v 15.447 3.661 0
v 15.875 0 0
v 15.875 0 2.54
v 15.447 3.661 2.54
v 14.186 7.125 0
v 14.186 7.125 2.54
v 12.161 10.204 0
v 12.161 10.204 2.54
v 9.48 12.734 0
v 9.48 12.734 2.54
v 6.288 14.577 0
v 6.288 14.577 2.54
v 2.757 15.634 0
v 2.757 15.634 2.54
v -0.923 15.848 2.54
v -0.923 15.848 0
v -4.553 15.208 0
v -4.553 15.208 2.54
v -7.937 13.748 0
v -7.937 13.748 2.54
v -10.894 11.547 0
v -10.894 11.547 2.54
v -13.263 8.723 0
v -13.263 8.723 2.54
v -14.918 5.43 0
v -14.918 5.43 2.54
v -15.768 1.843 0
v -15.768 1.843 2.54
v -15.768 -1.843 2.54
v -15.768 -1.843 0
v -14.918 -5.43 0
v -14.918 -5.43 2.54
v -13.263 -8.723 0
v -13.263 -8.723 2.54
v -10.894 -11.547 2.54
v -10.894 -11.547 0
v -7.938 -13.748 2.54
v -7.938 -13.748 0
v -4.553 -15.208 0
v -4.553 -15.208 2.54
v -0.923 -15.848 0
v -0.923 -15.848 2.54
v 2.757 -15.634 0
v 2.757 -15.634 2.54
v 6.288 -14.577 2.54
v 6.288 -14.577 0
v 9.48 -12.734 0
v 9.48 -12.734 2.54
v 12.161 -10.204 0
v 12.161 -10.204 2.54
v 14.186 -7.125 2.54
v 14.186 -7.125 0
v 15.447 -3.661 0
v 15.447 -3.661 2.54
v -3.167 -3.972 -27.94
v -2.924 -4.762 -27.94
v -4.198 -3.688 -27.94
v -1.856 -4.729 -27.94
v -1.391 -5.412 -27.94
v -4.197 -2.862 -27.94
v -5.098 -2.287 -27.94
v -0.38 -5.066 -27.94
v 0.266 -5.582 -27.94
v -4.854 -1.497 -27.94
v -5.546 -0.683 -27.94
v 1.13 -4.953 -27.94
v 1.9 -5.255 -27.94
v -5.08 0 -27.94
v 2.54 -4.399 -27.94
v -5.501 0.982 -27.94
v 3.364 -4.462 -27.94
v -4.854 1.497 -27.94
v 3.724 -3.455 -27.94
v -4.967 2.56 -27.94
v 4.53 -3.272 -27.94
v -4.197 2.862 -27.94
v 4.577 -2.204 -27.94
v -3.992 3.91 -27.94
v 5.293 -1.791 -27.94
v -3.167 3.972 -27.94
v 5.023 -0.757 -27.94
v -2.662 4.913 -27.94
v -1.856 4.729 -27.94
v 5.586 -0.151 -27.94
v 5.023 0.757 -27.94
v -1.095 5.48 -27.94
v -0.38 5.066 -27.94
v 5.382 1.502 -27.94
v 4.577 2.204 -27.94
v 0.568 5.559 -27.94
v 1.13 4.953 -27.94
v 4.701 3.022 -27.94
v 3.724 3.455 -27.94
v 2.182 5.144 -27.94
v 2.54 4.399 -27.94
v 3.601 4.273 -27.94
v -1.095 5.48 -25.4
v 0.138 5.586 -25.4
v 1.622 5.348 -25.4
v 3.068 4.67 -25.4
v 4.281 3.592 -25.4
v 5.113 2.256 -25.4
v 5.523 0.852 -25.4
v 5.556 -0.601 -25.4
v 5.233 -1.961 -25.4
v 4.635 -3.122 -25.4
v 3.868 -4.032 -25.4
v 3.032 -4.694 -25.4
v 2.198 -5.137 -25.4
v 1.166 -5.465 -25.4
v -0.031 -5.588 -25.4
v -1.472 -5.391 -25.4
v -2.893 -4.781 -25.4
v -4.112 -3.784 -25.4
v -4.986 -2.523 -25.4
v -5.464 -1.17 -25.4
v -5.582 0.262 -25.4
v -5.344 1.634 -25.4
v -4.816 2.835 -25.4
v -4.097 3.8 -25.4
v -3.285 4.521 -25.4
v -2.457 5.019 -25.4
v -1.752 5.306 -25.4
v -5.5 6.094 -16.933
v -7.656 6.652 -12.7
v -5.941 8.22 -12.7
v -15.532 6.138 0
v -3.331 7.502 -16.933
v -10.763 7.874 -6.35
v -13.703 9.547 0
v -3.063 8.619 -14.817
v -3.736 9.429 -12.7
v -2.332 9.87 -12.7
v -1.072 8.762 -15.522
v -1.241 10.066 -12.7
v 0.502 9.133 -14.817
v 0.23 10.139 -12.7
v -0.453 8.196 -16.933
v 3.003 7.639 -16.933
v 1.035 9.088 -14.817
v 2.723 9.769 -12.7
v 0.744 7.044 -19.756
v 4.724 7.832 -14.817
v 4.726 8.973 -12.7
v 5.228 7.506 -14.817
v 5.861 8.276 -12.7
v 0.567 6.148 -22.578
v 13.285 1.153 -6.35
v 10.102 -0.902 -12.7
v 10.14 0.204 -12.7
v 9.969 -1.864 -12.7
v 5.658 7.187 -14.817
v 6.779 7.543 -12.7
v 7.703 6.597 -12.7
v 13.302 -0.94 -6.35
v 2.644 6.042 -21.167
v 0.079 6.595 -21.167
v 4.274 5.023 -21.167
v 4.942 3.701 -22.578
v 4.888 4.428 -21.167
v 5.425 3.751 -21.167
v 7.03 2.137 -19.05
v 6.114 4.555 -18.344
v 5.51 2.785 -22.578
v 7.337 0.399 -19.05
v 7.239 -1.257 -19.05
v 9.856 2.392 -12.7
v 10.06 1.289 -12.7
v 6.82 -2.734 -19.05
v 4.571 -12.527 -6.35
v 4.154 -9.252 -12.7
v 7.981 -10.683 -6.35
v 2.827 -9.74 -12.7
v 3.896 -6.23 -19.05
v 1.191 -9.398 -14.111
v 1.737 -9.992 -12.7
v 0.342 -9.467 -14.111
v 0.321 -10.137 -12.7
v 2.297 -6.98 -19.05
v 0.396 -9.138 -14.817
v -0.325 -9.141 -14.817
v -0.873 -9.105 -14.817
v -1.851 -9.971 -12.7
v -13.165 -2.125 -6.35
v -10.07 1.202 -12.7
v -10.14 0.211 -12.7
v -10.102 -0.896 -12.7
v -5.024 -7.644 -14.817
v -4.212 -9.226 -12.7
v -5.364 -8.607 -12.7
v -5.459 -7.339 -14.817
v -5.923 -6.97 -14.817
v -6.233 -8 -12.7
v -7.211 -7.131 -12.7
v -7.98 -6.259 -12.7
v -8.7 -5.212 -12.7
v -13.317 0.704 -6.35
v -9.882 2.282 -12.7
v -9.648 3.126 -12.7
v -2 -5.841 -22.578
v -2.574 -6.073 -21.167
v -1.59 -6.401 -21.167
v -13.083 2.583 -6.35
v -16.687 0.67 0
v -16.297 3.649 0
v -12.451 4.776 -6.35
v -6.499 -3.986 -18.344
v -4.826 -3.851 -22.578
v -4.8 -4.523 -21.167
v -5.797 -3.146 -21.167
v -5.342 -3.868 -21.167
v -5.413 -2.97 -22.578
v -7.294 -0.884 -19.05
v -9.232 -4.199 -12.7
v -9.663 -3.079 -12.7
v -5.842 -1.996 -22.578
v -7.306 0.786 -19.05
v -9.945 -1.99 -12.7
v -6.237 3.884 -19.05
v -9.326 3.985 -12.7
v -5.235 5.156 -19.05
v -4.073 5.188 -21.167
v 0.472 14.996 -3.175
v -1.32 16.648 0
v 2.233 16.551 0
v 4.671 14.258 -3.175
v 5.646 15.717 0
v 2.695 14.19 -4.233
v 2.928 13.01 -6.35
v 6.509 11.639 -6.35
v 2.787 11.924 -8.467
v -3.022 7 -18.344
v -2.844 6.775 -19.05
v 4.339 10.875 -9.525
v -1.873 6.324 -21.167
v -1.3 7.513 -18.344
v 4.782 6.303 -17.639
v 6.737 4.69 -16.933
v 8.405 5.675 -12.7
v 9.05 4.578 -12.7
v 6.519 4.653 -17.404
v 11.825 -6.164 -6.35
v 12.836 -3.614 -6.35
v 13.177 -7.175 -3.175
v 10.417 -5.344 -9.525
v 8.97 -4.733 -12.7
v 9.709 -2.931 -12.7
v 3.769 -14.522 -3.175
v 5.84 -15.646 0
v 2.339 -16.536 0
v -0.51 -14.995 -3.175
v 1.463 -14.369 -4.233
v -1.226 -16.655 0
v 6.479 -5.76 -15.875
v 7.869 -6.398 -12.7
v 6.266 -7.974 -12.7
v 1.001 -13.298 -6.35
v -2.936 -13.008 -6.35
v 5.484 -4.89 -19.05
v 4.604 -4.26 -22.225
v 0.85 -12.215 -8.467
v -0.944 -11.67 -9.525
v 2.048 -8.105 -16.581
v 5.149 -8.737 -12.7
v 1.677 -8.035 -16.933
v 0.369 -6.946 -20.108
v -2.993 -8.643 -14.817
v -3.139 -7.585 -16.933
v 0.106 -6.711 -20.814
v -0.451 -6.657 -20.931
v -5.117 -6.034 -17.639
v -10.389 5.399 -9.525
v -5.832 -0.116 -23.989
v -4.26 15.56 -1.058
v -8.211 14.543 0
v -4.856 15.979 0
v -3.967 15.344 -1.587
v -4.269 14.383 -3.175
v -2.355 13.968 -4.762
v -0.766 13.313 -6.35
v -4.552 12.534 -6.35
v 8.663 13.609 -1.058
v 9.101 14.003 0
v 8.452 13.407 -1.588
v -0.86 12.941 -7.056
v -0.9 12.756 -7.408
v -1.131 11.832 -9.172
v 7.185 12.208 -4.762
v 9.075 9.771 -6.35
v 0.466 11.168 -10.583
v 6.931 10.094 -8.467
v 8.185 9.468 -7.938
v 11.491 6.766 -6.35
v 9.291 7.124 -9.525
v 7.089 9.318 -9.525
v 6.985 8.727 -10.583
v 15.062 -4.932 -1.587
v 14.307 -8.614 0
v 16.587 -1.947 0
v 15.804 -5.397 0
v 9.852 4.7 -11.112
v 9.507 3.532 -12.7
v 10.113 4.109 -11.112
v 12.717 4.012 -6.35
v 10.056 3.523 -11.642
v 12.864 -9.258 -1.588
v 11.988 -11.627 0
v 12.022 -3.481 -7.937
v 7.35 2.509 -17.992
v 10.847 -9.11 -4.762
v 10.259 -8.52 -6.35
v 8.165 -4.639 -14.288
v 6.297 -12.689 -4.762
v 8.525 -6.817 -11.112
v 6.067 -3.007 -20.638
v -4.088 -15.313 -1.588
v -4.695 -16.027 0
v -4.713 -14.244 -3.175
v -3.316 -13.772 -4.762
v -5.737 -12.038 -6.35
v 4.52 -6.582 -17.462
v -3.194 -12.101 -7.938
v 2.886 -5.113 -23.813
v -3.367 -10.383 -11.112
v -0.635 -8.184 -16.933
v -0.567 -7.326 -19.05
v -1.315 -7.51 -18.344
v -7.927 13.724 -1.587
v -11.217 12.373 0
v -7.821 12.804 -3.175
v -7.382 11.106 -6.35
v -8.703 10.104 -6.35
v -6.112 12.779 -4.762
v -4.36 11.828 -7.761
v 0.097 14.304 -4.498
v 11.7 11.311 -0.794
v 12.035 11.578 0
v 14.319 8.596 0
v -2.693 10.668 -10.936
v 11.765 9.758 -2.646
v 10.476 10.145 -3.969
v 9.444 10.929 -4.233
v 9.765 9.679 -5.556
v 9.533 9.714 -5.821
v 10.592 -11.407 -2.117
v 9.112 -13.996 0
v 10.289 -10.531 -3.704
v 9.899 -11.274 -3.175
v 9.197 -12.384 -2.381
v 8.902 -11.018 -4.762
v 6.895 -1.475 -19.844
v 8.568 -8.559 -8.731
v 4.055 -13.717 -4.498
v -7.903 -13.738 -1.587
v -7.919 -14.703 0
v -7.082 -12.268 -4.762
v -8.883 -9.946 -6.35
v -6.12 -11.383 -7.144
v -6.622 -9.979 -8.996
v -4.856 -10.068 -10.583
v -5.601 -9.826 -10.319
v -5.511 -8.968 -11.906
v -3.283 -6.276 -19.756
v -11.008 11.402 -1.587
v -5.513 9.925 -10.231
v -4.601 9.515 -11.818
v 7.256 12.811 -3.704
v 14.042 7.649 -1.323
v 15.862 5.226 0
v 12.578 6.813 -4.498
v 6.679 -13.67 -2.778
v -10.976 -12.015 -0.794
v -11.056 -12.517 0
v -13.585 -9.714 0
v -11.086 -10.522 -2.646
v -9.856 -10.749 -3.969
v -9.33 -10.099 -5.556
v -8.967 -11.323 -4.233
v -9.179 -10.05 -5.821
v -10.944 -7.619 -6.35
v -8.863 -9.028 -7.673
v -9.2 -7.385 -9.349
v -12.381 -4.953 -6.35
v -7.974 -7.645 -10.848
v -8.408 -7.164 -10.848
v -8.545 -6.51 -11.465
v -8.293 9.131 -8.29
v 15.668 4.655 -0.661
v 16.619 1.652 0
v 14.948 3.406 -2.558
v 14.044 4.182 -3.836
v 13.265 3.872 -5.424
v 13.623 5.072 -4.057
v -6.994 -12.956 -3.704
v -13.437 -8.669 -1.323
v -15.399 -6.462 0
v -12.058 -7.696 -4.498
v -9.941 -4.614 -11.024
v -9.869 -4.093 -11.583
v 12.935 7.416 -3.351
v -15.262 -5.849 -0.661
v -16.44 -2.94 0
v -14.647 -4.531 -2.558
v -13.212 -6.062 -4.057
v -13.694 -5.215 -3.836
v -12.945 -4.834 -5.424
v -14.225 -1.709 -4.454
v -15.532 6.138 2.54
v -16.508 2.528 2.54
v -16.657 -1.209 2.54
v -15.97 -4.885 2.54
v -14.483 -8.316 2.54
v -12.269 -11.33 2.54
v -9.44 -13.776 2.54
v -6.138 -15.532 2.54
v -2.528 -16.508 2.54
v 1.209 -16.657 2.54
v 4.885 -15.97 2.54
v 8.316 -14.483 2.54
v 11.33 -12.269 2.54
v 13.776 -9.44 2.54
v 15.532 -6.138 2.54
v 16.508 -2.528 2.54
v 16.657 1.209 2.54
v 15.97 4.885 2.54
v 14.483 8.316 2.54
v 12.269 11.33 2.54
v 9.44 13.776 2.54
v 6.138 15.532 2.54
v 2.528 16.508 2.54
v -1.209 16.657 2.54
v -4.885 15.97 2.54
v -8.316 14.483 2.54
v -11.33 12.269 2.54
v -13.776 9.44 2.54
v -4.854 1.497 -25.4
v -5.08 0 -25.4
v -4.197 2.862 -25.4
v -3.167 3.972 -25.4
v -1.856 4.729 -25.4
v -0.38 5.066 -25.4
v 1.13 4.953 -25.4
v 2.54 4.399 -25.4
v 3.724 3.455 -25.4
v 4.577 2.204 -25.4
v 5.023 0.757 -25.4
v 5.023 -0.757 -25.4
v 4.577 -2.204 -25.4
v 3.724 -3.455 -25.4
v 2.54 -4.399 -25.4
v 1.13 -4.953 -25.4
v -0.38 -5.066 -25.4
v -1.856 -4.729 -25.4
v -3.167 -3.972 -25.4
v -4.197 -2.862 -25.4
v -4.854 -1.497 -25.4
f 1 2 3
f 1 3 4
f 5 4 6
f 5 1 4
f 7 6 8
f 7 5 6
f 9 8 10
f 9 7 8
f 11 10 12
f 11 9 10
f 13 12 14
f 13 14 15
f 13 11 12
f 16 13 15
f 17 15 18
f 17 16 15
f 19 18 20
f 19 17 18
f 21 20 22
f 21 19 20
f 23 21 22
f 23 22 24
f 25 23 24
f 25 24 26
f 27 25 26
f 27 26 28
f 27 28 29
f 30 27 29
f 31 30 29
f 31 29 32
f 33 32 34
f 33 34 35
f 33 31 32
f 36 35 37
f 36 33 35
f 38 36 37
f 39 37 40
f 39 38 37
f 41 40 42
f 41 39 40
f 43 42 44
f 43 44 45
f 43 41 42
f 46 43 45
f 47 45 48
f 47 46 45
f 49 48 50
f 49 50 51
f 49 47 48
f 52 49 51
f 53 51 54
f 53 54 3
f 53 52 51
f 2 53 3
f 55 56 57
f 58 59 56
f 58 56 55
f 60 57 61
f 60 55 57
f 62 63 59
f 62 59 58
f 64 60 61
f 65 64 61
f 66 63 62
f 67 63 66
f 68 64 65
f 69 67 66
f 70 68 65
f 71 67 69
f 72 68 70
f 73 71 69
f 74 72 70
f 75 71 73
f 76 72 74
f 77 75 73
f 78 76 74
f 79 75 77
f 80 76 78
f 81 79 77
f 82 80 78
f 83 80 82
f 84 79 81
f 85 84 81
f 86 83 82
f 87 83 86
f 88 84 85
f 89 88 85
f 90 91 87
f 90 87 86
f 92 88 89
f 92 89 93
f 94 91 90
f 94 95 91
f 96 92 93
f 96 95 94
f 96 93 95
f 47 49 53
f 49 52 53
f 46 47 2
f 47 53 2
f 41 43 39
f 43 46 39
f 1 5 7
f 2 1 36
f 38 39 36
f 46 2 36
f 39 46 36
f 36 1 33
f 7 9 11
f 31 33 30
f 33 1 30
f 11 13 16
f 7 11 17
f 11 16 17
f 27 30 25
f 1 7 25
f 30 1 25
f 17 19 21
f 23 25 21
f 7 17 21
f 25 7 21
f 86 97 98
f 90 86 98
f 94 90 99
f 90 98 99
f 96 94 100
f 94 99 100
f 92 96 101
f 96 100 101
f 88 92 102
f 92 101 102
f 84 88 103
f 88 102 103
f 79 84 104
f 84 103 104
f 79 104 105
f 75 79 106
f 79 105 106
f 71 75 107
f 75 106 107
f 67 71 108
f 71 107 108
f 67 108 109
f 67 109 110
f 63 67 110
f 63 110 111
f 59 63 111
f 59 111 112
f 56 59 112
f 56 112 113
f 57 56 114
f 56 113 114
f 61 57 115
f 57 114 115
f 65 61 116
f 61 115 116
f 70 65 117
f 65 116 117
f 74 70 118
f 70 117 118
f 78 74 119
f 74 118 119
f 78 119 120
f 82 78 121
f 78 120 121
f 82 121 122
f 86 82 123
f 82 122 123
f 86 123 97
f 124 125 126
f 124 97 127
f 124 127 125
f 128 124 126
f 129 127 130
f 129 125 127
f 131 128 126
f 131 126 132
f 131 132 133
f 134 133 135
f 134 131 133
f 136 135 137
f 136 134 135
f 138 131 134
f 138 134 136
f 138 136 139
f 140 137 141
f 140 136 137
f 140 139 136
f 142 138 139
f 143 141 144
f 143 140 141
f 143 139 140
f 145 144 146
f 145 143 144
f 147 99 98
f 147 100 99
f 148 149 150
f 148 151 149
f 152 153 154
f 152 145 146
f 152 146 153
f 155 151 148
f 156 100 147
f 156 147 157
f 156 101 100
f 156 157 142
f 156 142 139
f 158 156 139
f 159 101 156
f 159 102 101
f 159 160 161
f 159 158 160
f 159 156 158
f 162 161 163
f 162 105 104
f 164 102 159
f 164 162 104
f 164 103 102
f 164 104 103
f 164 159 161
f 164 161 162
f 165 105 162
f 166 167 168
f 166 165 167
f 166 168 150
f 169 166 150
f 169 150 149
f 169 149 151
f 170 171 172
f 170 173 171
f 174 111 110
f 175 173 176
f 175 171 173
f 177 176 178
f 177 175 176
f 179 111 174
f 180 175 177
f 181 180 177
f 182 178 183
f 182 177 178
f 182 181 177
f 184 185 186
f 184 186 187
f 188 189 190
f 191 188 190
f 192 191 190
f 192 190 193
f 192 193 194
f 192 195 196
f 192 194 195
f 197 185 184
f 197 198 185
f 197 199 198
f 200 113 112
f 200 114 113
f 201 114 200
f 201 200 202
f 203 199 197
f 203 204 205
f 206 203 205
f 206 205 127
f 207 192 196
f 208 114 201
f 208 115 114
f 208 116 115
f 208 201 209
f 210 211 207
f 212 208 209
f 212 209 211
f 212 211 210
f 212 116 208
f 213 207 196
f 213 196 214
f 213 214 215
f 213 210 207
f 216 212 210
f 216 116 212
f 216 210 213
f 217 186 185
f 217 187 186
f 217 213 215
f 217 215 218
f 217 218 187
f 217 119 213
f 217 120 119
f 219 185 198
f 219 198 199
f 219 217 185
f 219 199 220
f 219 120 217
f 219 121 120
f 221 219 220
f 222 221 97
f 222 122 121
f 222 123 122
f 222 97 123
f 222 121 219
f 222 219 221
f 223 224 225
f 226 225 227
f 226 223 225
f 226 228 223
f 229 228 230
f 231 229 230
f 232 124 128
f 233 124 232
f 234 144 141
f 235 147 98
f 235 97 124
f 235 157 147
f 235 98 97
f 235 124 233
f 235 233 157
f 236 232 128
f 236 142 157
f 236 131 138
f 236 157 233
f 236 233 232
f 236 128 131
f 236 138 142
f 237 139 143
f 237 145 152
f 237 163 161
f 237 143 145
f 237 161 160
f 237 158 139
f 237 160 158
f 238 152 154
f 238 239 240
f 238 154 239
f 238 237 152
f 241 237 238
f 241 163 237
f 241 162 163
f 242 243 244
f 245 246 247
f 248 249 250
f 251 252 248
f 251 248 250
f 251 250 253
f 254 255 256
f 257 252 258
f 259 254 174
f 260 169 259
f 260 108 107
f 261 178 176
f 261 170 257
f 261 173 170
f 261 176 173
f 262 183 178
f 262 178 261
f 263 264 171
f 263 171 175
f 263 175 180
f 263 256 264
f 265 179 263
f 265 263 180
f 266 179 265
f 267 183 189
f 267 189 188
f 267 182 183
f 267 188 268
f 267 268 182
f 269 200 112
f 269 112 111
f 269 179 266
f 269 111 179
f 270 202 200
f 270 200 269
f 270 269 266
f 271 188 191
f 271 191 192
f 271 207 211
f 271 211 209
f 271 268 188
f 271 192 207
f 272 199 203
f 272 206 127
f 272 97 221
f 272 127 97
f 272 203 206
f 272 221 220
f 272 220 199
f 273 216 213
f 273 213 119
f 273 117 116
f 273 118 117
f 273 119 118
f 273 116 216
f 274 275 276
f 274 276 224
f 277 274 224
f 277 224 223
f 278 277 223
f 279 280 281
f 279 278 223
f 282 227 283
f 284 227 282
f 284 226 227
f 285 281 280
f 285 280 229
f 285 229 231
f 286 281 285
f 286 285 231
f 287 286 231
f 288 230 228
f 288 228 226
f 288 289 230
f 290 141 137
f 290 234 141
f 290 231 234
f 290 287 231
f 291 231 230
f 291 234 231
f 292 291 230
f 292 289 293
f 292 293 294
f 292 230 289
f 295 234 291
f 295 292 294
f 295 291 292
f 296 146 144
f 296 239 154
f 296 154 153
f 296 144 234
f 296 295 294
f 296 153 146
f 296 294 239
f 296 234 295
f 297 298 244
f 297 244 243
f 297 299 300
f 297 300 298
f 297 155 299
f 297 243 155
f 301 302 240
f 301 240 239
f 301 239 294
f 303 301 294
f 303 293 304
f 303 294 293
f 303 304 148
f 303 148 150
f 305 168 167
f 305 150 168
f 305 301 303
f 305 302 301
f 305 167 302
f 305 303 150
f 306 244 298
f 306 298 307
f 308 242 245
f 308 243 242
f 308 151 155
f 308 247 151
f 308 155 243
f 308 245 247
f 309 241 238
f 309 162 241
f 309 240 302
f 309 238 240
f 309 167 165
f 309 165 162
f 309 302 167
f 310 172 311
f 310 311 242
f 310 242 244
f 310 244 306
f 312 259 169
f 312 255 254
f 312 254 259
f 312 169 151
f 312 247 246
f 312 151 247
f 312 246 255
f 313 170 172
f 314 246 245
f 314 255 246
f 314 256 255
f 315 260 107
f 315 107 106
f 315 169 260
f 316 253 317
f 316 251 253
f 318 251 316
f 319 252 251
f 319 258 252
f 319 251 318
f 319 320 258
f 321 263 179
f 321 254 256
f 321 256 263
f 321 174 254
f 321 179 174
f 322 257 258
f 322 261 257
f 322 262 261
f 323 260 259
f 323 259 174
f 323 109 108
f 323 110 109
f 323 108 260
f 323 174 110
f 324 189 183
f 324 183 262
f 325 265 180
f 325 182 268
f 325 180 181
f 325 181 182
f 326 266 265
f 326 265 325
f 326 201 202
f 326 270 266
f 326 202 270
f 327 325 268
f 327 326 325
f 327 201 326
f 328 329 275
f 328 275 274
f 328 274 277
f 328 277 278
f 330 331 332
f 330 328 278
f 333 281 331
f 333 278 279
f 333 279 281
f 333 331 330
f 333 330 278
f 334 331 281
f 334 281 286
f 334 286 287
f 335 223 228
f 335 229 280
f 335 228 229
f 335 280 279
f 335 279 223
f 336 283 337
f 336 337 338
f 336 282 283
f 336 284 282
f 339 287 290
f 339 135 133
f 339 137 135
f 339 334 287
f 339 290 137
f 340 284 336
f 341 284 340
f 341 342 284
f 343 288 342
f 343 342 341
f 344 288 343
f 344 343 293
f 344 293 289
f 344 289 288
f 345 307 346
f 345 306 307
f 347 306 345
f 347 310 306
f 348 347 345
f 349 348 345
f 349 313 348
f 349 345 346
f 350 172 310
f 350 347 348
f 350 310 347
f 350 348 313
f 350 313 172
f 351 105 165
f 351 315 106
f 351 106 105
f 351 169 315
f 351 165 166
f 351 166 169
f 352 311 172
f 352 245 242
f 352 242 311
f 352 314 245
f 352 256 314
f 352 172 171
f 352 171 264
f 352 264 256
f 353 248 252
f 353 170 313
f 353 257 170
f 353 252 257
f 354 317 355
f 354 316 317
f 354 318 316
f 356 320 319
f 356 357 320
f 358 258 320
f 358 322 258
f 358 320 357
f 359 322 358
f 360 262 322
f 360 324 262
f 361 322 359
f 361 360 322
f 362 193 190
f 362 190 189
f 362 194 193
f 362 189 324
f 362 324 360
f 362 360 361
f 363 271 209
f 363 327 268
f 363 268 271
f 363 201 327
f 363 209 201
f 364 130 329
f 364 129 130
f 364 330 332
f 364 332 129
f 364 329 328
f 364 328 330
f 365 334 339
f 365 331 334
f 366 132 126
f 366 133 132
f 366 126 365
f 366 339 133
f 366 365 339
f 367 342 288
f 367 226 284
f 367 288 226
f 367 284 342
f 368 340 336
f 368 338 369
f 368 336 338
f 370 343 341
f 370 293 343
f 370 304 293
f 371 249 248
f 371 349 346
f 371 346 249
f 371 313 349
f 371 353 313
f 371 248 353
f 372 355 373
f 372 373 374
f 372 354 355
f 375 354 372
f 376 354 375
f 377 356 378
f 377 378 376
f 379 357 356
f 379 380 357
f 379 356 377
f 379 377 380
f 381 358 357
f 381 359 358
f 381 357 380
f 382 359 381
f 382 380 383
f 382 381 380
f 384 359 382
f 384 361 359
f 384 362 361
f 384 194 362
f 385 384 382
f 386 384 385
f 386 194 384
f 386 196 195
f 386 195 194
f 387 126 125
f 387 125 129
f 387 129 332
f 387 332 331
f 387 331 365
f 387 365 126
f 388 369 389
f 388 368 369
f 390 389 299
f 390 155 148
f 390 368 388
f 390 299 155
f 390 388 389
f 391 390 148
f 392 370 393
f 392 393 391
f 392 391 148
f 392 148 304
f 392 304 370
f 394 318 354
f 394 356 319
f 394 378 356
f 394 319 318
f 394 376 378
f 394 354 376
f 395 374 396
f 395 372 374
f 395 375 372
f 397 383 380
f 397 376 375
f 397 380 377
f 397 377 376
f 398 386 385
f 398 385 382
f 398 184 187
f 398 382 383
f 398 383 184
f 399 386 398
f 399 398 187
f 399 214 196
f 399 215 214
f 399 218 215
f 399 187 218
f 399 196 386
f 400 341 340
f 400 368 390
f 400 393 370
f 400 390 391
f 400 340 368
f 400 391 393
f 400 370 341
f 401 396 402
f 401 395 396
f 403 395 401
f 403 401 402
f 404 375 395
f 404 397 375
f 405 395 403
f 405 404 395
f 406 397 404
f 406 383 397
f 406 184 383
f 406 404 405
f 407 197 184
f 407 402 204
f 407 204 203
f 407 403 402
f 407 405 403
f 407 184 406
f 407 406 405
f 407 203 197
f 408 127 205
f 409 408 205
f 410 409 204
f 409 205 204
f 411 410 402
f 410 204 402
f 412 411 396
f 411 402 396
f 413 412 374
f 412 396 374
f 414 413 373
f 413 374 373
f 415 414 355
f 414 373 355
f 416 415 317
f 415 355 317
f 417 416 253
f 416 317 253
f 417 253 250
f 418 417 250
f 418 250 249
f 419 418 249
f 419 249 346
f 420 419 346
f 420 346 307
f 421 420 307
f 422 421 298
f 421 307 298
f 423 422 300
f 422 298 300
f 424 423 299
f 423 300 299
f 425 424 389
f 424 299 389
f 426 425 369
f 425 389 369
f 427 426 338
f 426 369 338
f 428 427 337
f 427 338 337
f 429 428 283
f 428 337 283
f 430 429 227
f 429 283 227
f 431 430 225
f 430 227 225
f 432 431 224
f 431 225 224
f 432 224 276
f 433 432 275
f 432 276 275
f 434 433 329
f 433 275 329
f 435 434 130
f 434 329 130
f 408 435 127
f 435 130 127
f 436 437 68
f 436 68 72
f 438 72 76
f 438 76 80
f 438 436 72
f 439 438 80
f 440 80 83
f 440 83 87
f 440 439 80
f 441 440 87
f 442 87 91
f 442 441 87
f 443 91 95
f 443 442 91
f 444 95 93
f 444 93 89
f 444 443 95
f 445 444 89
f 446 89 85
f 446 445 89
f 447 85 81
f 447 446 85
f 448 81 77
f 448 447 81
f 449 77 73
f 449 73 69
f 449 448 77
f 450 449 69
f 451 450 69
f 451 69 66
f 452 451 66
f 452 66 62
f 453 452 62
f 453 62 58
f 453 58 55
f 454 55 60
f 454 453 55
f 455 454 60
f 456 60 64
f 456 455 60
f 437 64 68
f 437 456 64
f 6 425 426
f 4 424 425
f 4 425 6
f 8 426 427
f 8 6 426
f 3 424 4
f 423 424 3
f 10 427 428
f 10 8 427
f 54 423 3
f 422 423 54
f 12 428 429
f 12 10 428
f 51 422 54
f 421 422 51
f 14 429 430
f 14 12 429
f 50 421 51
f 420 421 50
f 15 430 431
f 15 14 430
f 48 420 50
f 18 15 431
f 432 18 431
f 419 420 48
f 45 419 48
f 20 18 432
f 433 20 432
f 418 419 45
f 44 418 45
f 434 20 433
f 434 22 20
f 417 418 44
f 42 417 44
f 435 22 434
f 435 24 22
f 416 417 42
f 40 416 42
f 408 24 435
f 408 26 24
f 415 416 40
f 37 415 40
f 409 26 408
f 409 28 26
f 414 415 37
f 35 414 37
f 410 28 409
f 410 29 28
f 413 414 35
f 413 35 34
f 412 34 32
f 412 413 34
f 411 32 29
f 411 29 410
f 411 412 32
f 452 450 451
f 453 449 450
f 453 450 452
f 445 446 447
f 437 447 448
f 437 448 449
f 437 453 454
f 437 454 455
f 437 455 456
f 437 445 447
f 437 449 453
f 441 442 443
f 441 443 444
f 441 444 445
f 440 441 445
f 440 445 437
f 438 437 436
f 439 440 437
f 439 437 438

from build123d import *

# Parameters (mm, degrees)
SKETCH6_R           = 16.7005
SKETCH6_R_2         = 15.875
BOSS_EXTRUDE1_DEPTH = 2.54
SKETCH7_R           = 5.588
SKETCH7_R_2         = 5.08
BOSS_EXTRUDE2_DEPTH = 2.54


with BuildPart() as part:
    # Loft1: read off the stored shape, not the designer's step
    # Loft1: loft between two sections, ruled curve by curve
    loft1_from = [
        Edge.make_bspline([(-15.531591954, 6.138106517, 0), (-3.25537892, 37.201290426, 0), (27.807804989, 24.925077391, 0), (15.531591954, -6.138106517, 0), (3.25537892, -37.201290426, 0), (-27.807804989, -24.925077391, 0), (-15.531591954, 6.138106517, 0)], [0, 0, 0, 0, 0.5, 0.5, 0.5, 1, 1, 1, 1], 3, [1, 0.333333333, 0.333333333, 1, 0.333333333, 0.333333333, 1]),
    ]
    loft1_to = [
        Edge.make_bspline([(-1.095329605, 5.479598257, -25.4), (9.863866909, 7.670257467, -25.4), (12.054526119, -3.288939047, -25.4), (1.095329605, -5.479598257, -25.4), (-9.863866909, -7.670257467, -25.4), (-12.054526119, 3.288939047, -25.4), (-1.095329605, 5.479598257, -25.4)], [0, 0, 0, 0, 0.5, 0.5, 0.5, 1, 1, 1, 1], 3, [1, 0.333333333, 0.333333333, 1, 0.333333333, 0.333333333, 1]),
    ]
    loft1 = Solid(Shell([*[Face.make_surface_from_curves(loft1_from[k], loft1_to[k]) for k in range(1)], Face(Wire(loft1_from)), Face(Wire(loft1_to))]))
    add(loft1)

    # Sketch6 → Boss-Extrude1 (add)
    with BuildSketch(Plane.XY):
        with Locations(Location((0, 0, 0), (0, 0, 158.436))):
            Circle(SKETCH6_R)
        Circle(SKETCH6_R_2, mode=Mode.SUBTRACT)
    extrude(amount=BOSS_EXTRUDE1_DEPTH)

    # Sketch7 → Boss-Extrude2 (add)
    with BuildSketch(Plane(origin=(0, 0, -25.4), x_dir=(-1, 0, 0), z_dir=(0, 0, -1))):
        with Locations(Location((0, 0, 0), (0, 0, 78.696))):
            Circle(SKETCH7_R)
        Circle(SKETCH7_R_2, mode=Mode.SUBTRACT)
    extrude(amount=BOSS_EXTRUDE2_DEPTH)


solid = part.part
